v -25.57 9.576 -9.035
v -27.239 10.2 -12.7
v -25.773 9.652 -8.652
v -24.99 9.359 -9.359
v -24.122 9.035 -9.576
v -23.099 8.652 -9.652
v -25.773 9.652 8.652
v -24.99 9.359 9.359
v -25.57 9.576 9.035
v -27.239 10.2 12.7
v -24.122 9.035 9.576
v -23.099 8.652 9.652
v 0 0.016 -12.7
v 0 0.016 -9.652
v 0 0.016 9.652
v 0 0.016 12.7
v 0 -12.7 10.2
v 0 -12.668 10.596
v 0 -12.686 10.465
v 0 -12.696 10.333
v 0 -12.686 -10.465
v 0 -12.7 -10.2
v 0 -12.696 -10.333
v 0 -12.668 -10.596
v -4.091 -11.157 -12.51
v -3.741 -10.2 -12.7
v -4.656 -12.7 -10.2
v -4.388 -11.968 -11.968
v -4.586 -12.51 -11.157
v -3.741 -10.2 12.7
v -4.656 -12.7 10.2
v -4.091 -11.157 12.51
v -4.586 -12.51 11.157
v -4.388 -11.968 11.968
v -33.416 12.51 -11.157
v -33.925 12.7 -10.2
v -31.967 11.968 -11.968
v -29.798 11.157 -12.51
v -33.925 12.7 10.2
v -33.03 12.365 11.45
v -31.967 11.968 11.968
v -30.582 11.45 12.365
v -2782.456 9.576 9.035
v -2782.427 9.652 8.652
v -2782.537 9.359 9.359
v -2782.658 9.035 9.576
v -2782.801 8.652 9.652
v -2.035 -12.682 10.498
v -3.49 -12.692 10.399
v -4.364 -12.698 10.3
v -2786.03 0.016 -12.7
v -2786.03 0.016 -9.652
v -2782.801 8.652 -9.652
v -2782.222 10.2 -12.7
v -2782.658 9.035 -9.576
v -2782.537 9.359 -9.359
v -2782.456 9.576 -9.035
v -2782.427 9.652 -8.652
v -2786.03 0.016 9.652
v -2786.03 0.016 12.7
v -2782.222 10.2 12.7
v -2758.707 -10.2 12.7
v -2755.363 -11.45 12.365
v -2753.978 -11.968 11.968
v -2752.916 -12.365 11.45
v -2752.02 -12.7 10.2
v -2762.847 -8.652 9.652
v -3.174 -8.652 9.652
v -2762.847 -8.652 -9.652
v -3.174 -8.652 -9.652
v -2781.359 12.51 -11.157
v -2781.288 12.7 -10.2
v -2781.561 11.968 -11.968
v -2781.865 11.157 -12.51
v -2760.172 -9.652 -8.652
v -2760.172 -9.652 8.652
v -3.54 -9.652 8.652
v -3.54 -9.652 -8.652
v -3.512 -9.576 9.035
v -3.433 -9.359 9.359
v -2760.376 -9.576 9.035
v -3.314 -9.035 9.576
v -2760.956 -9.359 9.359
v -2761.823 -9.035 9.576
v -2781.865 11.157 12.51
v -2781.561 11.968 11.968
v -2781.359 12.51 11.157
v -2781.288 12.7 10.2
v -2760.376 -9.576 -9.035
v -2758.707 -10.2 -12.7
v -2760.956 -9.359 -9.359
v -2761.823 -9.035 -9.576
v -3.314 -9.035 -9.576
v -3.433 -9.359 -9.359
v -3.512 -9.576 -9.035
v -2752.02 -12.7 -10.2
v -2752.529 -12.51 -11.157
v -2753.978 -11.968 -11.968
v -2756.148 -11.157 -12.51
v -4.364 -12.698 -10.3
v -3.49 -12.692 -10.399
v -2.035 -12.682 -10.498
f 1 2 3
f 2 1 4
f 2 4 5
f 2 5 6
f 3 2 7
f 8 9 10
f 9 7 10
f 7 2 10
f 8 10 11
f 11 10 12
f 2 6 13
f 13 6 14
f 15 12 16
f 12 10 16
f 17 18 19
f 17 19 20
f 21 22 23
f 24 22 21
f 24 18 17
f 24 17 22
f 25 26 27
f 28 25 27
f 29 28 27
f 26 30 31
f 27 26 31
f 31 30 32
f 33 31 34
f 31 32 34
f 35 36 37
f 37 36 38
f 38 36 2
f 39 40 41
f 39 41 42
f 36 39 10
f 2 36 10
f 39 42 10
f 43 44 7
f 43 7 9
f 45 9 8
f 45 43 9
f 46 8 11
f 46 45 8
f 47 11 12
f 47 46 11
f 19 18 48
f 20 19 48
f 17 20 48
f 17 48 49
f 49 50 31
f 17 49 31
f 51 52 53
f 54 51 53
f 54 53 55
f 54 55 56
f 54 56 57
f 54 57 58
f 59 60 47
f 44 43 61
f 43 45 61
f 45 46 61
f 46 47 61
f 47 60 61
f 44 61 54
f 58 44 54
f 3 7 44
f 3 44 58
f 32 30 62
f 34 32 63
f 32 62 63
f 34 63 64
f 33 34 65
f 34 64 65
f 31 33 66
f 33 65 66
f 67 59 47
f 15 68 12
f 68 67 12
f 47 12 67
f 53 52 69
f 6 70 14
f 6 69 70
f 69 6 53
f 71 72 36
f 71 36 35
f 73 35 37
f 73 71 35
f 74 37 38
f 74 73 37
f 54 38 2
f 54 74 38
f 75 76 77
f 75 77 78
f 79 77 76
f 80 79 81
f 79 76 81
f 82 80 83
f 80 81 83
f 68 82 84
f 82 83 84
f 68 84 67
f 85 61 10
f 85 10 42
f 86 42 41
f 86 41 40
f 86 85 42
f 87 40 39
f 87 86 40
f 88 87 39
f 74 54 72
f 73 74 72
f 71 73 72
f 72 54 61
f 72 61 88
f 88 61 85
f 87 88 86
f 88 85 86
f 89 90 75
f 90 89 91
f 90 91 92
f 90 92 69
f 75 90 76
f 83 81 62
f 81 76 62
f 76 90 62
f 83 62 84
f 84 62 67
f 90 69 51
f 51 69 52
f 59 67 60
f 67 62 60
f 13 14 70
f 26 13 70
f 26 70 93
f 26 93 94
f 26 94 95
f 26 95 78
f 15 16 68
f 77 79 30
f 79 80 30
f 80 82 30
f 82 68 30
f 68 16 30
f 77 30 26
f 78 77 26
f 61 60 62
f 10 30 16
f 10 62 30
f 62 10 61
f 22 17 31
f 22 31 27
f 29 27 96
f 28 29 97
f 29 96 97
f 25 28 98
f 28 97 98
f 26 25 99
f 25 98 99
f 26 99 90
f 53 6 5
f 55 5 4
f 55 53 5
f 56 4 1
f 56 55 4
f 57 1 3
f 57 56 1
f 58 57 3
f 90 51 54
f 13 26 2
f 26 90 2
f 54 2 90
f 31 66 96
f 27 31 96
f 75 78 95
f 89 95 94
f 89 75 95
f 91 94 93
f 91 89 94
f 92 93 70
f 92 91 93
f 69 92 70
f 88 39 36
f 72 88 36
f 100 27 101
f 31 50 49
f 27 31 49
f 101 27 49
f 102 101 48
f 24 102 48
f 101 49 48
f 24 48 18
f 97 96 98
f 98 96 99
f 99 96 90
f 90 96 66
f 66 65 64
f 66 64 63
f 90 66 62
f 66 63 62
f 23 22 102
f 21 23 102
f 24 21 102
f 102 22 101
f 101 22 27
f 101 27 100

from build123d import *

# Parameters (mm, degrees)
SKETCH3_W           = 25.4
SKETCH3_H           = 25.4
SKETCH3_W_2         = 19.304
SKETCH3_H_2         = 19.304
BOSS_EXTRUDE1_DEPTH = 2786.03
FILLET1_R           = 2.5
FILLET2_R           = 1
CUT_EXTRUDE1_DEPTH  = 2787.174727274


with BuildPart() as part:
    # Sketch3 → Boss-Extrude1 (new body)
    with BuildSketch(Plane(origin=(0, 0, 0), x_dir=(0, 0, -1), z_dir=(1, 0, 0))):
        Rectangle(SKETCH3_W, SKETCH3_H)
        Rectangle(SKETCH3_W_2, SKETCH3_H_2, mode=Mode.SUBTRACT)
    extrude(amount=-BOSS_EXTRUDE1_DEPTH)

    # Fillet1
    fillet1_edges = [part.edges().sort_by_distance(p)[0] for p in [
        (-1393.015, -12.7, -12.7),
        (-1393.015, -12.7, 12.7),
        (-1393.015, 12.7, 12.7),
        (-1393.015, 12.7, -12.7),
    ]]
    fillet(fillet1_edges, radius=FILLET1_R)

    # Fillet2
    fillet2_edges = [part.edges().sort_by_distance(p)[0] for p in [
        (-1393.015, 9.652, -9.652),
        (-1393.015, -9.652, -9.652),
        (-1393.015, -9.652, 9.652),
        (-1393.015, 9.652, 9.652),
    ]]
    fillet(fillet2_edges, radius=FILLET2_R)

    # Sketch4 → Cut-Extrude1 (cut, through all)
    with BuildSketch(Plane.XY.offset(12.7)):
        Polygon((0, 10.2), (-27.238832211, 10.2), (0, 0.015817949), (0, 0.123092977), align=None)
        Polygon((-34.01, 12.731635899), (-27.238832211, 10.2), (0, 10.2), (0, 12.7), (0, 12.731635899), align=None)
        Polygon((0, 0.015817949), (-3.740622532, -10.2), (0, -10.2), align=None)
        Polygon((0, -10.2), (-3.740622532, -10.2), (-4.656022198, -12.7), (0, -12.668364101), align=None)
        Polygon((-2786.03, 12.7), (-2786.03, 10.2), (-2782.222290358, 10.2), (-2781.287578659, 12.7), align=None)
        Polygon((-2786.03, 10.2), (-2786.03, 0.015817949), (-2782.222290358, 10.2), align=None)
        Polygon((-2786.03, 0.015817949), (-2786.03, -10.2), (-2758.706553735, -10.2), align=None)
        Polygon((-2786.03, -10.2), (-2786.03, -12.7), (-2752.02, -12.7), (-2758.706553735, -10.2), align=None)
    extrude(amount=-CUT_EXTRUDE1_DEPTH, mode=Mode.SUBTRACT)


with BuildPart() as cut_extrude1_piece_1:
    # of the separate pieces the step leaves, piece 1, a body of its own (cut_extrude1_pieces)
    add(part.part.solids().sort_by_distance((-3.740622532, -10.2, 12.7))[0])


with BuildPart() as cut_extrude1_piece_2:
    # of the separate pieces the step leaves, piece 2, a body of its own (cut_extrude1_pieces)
    add(part.part.solids().sort_by_distance((0, -12.7, 10.2))[0])


solid = Compound([cut_extrude1_piece_1.part, cut_extrude1_piece_2.part])
